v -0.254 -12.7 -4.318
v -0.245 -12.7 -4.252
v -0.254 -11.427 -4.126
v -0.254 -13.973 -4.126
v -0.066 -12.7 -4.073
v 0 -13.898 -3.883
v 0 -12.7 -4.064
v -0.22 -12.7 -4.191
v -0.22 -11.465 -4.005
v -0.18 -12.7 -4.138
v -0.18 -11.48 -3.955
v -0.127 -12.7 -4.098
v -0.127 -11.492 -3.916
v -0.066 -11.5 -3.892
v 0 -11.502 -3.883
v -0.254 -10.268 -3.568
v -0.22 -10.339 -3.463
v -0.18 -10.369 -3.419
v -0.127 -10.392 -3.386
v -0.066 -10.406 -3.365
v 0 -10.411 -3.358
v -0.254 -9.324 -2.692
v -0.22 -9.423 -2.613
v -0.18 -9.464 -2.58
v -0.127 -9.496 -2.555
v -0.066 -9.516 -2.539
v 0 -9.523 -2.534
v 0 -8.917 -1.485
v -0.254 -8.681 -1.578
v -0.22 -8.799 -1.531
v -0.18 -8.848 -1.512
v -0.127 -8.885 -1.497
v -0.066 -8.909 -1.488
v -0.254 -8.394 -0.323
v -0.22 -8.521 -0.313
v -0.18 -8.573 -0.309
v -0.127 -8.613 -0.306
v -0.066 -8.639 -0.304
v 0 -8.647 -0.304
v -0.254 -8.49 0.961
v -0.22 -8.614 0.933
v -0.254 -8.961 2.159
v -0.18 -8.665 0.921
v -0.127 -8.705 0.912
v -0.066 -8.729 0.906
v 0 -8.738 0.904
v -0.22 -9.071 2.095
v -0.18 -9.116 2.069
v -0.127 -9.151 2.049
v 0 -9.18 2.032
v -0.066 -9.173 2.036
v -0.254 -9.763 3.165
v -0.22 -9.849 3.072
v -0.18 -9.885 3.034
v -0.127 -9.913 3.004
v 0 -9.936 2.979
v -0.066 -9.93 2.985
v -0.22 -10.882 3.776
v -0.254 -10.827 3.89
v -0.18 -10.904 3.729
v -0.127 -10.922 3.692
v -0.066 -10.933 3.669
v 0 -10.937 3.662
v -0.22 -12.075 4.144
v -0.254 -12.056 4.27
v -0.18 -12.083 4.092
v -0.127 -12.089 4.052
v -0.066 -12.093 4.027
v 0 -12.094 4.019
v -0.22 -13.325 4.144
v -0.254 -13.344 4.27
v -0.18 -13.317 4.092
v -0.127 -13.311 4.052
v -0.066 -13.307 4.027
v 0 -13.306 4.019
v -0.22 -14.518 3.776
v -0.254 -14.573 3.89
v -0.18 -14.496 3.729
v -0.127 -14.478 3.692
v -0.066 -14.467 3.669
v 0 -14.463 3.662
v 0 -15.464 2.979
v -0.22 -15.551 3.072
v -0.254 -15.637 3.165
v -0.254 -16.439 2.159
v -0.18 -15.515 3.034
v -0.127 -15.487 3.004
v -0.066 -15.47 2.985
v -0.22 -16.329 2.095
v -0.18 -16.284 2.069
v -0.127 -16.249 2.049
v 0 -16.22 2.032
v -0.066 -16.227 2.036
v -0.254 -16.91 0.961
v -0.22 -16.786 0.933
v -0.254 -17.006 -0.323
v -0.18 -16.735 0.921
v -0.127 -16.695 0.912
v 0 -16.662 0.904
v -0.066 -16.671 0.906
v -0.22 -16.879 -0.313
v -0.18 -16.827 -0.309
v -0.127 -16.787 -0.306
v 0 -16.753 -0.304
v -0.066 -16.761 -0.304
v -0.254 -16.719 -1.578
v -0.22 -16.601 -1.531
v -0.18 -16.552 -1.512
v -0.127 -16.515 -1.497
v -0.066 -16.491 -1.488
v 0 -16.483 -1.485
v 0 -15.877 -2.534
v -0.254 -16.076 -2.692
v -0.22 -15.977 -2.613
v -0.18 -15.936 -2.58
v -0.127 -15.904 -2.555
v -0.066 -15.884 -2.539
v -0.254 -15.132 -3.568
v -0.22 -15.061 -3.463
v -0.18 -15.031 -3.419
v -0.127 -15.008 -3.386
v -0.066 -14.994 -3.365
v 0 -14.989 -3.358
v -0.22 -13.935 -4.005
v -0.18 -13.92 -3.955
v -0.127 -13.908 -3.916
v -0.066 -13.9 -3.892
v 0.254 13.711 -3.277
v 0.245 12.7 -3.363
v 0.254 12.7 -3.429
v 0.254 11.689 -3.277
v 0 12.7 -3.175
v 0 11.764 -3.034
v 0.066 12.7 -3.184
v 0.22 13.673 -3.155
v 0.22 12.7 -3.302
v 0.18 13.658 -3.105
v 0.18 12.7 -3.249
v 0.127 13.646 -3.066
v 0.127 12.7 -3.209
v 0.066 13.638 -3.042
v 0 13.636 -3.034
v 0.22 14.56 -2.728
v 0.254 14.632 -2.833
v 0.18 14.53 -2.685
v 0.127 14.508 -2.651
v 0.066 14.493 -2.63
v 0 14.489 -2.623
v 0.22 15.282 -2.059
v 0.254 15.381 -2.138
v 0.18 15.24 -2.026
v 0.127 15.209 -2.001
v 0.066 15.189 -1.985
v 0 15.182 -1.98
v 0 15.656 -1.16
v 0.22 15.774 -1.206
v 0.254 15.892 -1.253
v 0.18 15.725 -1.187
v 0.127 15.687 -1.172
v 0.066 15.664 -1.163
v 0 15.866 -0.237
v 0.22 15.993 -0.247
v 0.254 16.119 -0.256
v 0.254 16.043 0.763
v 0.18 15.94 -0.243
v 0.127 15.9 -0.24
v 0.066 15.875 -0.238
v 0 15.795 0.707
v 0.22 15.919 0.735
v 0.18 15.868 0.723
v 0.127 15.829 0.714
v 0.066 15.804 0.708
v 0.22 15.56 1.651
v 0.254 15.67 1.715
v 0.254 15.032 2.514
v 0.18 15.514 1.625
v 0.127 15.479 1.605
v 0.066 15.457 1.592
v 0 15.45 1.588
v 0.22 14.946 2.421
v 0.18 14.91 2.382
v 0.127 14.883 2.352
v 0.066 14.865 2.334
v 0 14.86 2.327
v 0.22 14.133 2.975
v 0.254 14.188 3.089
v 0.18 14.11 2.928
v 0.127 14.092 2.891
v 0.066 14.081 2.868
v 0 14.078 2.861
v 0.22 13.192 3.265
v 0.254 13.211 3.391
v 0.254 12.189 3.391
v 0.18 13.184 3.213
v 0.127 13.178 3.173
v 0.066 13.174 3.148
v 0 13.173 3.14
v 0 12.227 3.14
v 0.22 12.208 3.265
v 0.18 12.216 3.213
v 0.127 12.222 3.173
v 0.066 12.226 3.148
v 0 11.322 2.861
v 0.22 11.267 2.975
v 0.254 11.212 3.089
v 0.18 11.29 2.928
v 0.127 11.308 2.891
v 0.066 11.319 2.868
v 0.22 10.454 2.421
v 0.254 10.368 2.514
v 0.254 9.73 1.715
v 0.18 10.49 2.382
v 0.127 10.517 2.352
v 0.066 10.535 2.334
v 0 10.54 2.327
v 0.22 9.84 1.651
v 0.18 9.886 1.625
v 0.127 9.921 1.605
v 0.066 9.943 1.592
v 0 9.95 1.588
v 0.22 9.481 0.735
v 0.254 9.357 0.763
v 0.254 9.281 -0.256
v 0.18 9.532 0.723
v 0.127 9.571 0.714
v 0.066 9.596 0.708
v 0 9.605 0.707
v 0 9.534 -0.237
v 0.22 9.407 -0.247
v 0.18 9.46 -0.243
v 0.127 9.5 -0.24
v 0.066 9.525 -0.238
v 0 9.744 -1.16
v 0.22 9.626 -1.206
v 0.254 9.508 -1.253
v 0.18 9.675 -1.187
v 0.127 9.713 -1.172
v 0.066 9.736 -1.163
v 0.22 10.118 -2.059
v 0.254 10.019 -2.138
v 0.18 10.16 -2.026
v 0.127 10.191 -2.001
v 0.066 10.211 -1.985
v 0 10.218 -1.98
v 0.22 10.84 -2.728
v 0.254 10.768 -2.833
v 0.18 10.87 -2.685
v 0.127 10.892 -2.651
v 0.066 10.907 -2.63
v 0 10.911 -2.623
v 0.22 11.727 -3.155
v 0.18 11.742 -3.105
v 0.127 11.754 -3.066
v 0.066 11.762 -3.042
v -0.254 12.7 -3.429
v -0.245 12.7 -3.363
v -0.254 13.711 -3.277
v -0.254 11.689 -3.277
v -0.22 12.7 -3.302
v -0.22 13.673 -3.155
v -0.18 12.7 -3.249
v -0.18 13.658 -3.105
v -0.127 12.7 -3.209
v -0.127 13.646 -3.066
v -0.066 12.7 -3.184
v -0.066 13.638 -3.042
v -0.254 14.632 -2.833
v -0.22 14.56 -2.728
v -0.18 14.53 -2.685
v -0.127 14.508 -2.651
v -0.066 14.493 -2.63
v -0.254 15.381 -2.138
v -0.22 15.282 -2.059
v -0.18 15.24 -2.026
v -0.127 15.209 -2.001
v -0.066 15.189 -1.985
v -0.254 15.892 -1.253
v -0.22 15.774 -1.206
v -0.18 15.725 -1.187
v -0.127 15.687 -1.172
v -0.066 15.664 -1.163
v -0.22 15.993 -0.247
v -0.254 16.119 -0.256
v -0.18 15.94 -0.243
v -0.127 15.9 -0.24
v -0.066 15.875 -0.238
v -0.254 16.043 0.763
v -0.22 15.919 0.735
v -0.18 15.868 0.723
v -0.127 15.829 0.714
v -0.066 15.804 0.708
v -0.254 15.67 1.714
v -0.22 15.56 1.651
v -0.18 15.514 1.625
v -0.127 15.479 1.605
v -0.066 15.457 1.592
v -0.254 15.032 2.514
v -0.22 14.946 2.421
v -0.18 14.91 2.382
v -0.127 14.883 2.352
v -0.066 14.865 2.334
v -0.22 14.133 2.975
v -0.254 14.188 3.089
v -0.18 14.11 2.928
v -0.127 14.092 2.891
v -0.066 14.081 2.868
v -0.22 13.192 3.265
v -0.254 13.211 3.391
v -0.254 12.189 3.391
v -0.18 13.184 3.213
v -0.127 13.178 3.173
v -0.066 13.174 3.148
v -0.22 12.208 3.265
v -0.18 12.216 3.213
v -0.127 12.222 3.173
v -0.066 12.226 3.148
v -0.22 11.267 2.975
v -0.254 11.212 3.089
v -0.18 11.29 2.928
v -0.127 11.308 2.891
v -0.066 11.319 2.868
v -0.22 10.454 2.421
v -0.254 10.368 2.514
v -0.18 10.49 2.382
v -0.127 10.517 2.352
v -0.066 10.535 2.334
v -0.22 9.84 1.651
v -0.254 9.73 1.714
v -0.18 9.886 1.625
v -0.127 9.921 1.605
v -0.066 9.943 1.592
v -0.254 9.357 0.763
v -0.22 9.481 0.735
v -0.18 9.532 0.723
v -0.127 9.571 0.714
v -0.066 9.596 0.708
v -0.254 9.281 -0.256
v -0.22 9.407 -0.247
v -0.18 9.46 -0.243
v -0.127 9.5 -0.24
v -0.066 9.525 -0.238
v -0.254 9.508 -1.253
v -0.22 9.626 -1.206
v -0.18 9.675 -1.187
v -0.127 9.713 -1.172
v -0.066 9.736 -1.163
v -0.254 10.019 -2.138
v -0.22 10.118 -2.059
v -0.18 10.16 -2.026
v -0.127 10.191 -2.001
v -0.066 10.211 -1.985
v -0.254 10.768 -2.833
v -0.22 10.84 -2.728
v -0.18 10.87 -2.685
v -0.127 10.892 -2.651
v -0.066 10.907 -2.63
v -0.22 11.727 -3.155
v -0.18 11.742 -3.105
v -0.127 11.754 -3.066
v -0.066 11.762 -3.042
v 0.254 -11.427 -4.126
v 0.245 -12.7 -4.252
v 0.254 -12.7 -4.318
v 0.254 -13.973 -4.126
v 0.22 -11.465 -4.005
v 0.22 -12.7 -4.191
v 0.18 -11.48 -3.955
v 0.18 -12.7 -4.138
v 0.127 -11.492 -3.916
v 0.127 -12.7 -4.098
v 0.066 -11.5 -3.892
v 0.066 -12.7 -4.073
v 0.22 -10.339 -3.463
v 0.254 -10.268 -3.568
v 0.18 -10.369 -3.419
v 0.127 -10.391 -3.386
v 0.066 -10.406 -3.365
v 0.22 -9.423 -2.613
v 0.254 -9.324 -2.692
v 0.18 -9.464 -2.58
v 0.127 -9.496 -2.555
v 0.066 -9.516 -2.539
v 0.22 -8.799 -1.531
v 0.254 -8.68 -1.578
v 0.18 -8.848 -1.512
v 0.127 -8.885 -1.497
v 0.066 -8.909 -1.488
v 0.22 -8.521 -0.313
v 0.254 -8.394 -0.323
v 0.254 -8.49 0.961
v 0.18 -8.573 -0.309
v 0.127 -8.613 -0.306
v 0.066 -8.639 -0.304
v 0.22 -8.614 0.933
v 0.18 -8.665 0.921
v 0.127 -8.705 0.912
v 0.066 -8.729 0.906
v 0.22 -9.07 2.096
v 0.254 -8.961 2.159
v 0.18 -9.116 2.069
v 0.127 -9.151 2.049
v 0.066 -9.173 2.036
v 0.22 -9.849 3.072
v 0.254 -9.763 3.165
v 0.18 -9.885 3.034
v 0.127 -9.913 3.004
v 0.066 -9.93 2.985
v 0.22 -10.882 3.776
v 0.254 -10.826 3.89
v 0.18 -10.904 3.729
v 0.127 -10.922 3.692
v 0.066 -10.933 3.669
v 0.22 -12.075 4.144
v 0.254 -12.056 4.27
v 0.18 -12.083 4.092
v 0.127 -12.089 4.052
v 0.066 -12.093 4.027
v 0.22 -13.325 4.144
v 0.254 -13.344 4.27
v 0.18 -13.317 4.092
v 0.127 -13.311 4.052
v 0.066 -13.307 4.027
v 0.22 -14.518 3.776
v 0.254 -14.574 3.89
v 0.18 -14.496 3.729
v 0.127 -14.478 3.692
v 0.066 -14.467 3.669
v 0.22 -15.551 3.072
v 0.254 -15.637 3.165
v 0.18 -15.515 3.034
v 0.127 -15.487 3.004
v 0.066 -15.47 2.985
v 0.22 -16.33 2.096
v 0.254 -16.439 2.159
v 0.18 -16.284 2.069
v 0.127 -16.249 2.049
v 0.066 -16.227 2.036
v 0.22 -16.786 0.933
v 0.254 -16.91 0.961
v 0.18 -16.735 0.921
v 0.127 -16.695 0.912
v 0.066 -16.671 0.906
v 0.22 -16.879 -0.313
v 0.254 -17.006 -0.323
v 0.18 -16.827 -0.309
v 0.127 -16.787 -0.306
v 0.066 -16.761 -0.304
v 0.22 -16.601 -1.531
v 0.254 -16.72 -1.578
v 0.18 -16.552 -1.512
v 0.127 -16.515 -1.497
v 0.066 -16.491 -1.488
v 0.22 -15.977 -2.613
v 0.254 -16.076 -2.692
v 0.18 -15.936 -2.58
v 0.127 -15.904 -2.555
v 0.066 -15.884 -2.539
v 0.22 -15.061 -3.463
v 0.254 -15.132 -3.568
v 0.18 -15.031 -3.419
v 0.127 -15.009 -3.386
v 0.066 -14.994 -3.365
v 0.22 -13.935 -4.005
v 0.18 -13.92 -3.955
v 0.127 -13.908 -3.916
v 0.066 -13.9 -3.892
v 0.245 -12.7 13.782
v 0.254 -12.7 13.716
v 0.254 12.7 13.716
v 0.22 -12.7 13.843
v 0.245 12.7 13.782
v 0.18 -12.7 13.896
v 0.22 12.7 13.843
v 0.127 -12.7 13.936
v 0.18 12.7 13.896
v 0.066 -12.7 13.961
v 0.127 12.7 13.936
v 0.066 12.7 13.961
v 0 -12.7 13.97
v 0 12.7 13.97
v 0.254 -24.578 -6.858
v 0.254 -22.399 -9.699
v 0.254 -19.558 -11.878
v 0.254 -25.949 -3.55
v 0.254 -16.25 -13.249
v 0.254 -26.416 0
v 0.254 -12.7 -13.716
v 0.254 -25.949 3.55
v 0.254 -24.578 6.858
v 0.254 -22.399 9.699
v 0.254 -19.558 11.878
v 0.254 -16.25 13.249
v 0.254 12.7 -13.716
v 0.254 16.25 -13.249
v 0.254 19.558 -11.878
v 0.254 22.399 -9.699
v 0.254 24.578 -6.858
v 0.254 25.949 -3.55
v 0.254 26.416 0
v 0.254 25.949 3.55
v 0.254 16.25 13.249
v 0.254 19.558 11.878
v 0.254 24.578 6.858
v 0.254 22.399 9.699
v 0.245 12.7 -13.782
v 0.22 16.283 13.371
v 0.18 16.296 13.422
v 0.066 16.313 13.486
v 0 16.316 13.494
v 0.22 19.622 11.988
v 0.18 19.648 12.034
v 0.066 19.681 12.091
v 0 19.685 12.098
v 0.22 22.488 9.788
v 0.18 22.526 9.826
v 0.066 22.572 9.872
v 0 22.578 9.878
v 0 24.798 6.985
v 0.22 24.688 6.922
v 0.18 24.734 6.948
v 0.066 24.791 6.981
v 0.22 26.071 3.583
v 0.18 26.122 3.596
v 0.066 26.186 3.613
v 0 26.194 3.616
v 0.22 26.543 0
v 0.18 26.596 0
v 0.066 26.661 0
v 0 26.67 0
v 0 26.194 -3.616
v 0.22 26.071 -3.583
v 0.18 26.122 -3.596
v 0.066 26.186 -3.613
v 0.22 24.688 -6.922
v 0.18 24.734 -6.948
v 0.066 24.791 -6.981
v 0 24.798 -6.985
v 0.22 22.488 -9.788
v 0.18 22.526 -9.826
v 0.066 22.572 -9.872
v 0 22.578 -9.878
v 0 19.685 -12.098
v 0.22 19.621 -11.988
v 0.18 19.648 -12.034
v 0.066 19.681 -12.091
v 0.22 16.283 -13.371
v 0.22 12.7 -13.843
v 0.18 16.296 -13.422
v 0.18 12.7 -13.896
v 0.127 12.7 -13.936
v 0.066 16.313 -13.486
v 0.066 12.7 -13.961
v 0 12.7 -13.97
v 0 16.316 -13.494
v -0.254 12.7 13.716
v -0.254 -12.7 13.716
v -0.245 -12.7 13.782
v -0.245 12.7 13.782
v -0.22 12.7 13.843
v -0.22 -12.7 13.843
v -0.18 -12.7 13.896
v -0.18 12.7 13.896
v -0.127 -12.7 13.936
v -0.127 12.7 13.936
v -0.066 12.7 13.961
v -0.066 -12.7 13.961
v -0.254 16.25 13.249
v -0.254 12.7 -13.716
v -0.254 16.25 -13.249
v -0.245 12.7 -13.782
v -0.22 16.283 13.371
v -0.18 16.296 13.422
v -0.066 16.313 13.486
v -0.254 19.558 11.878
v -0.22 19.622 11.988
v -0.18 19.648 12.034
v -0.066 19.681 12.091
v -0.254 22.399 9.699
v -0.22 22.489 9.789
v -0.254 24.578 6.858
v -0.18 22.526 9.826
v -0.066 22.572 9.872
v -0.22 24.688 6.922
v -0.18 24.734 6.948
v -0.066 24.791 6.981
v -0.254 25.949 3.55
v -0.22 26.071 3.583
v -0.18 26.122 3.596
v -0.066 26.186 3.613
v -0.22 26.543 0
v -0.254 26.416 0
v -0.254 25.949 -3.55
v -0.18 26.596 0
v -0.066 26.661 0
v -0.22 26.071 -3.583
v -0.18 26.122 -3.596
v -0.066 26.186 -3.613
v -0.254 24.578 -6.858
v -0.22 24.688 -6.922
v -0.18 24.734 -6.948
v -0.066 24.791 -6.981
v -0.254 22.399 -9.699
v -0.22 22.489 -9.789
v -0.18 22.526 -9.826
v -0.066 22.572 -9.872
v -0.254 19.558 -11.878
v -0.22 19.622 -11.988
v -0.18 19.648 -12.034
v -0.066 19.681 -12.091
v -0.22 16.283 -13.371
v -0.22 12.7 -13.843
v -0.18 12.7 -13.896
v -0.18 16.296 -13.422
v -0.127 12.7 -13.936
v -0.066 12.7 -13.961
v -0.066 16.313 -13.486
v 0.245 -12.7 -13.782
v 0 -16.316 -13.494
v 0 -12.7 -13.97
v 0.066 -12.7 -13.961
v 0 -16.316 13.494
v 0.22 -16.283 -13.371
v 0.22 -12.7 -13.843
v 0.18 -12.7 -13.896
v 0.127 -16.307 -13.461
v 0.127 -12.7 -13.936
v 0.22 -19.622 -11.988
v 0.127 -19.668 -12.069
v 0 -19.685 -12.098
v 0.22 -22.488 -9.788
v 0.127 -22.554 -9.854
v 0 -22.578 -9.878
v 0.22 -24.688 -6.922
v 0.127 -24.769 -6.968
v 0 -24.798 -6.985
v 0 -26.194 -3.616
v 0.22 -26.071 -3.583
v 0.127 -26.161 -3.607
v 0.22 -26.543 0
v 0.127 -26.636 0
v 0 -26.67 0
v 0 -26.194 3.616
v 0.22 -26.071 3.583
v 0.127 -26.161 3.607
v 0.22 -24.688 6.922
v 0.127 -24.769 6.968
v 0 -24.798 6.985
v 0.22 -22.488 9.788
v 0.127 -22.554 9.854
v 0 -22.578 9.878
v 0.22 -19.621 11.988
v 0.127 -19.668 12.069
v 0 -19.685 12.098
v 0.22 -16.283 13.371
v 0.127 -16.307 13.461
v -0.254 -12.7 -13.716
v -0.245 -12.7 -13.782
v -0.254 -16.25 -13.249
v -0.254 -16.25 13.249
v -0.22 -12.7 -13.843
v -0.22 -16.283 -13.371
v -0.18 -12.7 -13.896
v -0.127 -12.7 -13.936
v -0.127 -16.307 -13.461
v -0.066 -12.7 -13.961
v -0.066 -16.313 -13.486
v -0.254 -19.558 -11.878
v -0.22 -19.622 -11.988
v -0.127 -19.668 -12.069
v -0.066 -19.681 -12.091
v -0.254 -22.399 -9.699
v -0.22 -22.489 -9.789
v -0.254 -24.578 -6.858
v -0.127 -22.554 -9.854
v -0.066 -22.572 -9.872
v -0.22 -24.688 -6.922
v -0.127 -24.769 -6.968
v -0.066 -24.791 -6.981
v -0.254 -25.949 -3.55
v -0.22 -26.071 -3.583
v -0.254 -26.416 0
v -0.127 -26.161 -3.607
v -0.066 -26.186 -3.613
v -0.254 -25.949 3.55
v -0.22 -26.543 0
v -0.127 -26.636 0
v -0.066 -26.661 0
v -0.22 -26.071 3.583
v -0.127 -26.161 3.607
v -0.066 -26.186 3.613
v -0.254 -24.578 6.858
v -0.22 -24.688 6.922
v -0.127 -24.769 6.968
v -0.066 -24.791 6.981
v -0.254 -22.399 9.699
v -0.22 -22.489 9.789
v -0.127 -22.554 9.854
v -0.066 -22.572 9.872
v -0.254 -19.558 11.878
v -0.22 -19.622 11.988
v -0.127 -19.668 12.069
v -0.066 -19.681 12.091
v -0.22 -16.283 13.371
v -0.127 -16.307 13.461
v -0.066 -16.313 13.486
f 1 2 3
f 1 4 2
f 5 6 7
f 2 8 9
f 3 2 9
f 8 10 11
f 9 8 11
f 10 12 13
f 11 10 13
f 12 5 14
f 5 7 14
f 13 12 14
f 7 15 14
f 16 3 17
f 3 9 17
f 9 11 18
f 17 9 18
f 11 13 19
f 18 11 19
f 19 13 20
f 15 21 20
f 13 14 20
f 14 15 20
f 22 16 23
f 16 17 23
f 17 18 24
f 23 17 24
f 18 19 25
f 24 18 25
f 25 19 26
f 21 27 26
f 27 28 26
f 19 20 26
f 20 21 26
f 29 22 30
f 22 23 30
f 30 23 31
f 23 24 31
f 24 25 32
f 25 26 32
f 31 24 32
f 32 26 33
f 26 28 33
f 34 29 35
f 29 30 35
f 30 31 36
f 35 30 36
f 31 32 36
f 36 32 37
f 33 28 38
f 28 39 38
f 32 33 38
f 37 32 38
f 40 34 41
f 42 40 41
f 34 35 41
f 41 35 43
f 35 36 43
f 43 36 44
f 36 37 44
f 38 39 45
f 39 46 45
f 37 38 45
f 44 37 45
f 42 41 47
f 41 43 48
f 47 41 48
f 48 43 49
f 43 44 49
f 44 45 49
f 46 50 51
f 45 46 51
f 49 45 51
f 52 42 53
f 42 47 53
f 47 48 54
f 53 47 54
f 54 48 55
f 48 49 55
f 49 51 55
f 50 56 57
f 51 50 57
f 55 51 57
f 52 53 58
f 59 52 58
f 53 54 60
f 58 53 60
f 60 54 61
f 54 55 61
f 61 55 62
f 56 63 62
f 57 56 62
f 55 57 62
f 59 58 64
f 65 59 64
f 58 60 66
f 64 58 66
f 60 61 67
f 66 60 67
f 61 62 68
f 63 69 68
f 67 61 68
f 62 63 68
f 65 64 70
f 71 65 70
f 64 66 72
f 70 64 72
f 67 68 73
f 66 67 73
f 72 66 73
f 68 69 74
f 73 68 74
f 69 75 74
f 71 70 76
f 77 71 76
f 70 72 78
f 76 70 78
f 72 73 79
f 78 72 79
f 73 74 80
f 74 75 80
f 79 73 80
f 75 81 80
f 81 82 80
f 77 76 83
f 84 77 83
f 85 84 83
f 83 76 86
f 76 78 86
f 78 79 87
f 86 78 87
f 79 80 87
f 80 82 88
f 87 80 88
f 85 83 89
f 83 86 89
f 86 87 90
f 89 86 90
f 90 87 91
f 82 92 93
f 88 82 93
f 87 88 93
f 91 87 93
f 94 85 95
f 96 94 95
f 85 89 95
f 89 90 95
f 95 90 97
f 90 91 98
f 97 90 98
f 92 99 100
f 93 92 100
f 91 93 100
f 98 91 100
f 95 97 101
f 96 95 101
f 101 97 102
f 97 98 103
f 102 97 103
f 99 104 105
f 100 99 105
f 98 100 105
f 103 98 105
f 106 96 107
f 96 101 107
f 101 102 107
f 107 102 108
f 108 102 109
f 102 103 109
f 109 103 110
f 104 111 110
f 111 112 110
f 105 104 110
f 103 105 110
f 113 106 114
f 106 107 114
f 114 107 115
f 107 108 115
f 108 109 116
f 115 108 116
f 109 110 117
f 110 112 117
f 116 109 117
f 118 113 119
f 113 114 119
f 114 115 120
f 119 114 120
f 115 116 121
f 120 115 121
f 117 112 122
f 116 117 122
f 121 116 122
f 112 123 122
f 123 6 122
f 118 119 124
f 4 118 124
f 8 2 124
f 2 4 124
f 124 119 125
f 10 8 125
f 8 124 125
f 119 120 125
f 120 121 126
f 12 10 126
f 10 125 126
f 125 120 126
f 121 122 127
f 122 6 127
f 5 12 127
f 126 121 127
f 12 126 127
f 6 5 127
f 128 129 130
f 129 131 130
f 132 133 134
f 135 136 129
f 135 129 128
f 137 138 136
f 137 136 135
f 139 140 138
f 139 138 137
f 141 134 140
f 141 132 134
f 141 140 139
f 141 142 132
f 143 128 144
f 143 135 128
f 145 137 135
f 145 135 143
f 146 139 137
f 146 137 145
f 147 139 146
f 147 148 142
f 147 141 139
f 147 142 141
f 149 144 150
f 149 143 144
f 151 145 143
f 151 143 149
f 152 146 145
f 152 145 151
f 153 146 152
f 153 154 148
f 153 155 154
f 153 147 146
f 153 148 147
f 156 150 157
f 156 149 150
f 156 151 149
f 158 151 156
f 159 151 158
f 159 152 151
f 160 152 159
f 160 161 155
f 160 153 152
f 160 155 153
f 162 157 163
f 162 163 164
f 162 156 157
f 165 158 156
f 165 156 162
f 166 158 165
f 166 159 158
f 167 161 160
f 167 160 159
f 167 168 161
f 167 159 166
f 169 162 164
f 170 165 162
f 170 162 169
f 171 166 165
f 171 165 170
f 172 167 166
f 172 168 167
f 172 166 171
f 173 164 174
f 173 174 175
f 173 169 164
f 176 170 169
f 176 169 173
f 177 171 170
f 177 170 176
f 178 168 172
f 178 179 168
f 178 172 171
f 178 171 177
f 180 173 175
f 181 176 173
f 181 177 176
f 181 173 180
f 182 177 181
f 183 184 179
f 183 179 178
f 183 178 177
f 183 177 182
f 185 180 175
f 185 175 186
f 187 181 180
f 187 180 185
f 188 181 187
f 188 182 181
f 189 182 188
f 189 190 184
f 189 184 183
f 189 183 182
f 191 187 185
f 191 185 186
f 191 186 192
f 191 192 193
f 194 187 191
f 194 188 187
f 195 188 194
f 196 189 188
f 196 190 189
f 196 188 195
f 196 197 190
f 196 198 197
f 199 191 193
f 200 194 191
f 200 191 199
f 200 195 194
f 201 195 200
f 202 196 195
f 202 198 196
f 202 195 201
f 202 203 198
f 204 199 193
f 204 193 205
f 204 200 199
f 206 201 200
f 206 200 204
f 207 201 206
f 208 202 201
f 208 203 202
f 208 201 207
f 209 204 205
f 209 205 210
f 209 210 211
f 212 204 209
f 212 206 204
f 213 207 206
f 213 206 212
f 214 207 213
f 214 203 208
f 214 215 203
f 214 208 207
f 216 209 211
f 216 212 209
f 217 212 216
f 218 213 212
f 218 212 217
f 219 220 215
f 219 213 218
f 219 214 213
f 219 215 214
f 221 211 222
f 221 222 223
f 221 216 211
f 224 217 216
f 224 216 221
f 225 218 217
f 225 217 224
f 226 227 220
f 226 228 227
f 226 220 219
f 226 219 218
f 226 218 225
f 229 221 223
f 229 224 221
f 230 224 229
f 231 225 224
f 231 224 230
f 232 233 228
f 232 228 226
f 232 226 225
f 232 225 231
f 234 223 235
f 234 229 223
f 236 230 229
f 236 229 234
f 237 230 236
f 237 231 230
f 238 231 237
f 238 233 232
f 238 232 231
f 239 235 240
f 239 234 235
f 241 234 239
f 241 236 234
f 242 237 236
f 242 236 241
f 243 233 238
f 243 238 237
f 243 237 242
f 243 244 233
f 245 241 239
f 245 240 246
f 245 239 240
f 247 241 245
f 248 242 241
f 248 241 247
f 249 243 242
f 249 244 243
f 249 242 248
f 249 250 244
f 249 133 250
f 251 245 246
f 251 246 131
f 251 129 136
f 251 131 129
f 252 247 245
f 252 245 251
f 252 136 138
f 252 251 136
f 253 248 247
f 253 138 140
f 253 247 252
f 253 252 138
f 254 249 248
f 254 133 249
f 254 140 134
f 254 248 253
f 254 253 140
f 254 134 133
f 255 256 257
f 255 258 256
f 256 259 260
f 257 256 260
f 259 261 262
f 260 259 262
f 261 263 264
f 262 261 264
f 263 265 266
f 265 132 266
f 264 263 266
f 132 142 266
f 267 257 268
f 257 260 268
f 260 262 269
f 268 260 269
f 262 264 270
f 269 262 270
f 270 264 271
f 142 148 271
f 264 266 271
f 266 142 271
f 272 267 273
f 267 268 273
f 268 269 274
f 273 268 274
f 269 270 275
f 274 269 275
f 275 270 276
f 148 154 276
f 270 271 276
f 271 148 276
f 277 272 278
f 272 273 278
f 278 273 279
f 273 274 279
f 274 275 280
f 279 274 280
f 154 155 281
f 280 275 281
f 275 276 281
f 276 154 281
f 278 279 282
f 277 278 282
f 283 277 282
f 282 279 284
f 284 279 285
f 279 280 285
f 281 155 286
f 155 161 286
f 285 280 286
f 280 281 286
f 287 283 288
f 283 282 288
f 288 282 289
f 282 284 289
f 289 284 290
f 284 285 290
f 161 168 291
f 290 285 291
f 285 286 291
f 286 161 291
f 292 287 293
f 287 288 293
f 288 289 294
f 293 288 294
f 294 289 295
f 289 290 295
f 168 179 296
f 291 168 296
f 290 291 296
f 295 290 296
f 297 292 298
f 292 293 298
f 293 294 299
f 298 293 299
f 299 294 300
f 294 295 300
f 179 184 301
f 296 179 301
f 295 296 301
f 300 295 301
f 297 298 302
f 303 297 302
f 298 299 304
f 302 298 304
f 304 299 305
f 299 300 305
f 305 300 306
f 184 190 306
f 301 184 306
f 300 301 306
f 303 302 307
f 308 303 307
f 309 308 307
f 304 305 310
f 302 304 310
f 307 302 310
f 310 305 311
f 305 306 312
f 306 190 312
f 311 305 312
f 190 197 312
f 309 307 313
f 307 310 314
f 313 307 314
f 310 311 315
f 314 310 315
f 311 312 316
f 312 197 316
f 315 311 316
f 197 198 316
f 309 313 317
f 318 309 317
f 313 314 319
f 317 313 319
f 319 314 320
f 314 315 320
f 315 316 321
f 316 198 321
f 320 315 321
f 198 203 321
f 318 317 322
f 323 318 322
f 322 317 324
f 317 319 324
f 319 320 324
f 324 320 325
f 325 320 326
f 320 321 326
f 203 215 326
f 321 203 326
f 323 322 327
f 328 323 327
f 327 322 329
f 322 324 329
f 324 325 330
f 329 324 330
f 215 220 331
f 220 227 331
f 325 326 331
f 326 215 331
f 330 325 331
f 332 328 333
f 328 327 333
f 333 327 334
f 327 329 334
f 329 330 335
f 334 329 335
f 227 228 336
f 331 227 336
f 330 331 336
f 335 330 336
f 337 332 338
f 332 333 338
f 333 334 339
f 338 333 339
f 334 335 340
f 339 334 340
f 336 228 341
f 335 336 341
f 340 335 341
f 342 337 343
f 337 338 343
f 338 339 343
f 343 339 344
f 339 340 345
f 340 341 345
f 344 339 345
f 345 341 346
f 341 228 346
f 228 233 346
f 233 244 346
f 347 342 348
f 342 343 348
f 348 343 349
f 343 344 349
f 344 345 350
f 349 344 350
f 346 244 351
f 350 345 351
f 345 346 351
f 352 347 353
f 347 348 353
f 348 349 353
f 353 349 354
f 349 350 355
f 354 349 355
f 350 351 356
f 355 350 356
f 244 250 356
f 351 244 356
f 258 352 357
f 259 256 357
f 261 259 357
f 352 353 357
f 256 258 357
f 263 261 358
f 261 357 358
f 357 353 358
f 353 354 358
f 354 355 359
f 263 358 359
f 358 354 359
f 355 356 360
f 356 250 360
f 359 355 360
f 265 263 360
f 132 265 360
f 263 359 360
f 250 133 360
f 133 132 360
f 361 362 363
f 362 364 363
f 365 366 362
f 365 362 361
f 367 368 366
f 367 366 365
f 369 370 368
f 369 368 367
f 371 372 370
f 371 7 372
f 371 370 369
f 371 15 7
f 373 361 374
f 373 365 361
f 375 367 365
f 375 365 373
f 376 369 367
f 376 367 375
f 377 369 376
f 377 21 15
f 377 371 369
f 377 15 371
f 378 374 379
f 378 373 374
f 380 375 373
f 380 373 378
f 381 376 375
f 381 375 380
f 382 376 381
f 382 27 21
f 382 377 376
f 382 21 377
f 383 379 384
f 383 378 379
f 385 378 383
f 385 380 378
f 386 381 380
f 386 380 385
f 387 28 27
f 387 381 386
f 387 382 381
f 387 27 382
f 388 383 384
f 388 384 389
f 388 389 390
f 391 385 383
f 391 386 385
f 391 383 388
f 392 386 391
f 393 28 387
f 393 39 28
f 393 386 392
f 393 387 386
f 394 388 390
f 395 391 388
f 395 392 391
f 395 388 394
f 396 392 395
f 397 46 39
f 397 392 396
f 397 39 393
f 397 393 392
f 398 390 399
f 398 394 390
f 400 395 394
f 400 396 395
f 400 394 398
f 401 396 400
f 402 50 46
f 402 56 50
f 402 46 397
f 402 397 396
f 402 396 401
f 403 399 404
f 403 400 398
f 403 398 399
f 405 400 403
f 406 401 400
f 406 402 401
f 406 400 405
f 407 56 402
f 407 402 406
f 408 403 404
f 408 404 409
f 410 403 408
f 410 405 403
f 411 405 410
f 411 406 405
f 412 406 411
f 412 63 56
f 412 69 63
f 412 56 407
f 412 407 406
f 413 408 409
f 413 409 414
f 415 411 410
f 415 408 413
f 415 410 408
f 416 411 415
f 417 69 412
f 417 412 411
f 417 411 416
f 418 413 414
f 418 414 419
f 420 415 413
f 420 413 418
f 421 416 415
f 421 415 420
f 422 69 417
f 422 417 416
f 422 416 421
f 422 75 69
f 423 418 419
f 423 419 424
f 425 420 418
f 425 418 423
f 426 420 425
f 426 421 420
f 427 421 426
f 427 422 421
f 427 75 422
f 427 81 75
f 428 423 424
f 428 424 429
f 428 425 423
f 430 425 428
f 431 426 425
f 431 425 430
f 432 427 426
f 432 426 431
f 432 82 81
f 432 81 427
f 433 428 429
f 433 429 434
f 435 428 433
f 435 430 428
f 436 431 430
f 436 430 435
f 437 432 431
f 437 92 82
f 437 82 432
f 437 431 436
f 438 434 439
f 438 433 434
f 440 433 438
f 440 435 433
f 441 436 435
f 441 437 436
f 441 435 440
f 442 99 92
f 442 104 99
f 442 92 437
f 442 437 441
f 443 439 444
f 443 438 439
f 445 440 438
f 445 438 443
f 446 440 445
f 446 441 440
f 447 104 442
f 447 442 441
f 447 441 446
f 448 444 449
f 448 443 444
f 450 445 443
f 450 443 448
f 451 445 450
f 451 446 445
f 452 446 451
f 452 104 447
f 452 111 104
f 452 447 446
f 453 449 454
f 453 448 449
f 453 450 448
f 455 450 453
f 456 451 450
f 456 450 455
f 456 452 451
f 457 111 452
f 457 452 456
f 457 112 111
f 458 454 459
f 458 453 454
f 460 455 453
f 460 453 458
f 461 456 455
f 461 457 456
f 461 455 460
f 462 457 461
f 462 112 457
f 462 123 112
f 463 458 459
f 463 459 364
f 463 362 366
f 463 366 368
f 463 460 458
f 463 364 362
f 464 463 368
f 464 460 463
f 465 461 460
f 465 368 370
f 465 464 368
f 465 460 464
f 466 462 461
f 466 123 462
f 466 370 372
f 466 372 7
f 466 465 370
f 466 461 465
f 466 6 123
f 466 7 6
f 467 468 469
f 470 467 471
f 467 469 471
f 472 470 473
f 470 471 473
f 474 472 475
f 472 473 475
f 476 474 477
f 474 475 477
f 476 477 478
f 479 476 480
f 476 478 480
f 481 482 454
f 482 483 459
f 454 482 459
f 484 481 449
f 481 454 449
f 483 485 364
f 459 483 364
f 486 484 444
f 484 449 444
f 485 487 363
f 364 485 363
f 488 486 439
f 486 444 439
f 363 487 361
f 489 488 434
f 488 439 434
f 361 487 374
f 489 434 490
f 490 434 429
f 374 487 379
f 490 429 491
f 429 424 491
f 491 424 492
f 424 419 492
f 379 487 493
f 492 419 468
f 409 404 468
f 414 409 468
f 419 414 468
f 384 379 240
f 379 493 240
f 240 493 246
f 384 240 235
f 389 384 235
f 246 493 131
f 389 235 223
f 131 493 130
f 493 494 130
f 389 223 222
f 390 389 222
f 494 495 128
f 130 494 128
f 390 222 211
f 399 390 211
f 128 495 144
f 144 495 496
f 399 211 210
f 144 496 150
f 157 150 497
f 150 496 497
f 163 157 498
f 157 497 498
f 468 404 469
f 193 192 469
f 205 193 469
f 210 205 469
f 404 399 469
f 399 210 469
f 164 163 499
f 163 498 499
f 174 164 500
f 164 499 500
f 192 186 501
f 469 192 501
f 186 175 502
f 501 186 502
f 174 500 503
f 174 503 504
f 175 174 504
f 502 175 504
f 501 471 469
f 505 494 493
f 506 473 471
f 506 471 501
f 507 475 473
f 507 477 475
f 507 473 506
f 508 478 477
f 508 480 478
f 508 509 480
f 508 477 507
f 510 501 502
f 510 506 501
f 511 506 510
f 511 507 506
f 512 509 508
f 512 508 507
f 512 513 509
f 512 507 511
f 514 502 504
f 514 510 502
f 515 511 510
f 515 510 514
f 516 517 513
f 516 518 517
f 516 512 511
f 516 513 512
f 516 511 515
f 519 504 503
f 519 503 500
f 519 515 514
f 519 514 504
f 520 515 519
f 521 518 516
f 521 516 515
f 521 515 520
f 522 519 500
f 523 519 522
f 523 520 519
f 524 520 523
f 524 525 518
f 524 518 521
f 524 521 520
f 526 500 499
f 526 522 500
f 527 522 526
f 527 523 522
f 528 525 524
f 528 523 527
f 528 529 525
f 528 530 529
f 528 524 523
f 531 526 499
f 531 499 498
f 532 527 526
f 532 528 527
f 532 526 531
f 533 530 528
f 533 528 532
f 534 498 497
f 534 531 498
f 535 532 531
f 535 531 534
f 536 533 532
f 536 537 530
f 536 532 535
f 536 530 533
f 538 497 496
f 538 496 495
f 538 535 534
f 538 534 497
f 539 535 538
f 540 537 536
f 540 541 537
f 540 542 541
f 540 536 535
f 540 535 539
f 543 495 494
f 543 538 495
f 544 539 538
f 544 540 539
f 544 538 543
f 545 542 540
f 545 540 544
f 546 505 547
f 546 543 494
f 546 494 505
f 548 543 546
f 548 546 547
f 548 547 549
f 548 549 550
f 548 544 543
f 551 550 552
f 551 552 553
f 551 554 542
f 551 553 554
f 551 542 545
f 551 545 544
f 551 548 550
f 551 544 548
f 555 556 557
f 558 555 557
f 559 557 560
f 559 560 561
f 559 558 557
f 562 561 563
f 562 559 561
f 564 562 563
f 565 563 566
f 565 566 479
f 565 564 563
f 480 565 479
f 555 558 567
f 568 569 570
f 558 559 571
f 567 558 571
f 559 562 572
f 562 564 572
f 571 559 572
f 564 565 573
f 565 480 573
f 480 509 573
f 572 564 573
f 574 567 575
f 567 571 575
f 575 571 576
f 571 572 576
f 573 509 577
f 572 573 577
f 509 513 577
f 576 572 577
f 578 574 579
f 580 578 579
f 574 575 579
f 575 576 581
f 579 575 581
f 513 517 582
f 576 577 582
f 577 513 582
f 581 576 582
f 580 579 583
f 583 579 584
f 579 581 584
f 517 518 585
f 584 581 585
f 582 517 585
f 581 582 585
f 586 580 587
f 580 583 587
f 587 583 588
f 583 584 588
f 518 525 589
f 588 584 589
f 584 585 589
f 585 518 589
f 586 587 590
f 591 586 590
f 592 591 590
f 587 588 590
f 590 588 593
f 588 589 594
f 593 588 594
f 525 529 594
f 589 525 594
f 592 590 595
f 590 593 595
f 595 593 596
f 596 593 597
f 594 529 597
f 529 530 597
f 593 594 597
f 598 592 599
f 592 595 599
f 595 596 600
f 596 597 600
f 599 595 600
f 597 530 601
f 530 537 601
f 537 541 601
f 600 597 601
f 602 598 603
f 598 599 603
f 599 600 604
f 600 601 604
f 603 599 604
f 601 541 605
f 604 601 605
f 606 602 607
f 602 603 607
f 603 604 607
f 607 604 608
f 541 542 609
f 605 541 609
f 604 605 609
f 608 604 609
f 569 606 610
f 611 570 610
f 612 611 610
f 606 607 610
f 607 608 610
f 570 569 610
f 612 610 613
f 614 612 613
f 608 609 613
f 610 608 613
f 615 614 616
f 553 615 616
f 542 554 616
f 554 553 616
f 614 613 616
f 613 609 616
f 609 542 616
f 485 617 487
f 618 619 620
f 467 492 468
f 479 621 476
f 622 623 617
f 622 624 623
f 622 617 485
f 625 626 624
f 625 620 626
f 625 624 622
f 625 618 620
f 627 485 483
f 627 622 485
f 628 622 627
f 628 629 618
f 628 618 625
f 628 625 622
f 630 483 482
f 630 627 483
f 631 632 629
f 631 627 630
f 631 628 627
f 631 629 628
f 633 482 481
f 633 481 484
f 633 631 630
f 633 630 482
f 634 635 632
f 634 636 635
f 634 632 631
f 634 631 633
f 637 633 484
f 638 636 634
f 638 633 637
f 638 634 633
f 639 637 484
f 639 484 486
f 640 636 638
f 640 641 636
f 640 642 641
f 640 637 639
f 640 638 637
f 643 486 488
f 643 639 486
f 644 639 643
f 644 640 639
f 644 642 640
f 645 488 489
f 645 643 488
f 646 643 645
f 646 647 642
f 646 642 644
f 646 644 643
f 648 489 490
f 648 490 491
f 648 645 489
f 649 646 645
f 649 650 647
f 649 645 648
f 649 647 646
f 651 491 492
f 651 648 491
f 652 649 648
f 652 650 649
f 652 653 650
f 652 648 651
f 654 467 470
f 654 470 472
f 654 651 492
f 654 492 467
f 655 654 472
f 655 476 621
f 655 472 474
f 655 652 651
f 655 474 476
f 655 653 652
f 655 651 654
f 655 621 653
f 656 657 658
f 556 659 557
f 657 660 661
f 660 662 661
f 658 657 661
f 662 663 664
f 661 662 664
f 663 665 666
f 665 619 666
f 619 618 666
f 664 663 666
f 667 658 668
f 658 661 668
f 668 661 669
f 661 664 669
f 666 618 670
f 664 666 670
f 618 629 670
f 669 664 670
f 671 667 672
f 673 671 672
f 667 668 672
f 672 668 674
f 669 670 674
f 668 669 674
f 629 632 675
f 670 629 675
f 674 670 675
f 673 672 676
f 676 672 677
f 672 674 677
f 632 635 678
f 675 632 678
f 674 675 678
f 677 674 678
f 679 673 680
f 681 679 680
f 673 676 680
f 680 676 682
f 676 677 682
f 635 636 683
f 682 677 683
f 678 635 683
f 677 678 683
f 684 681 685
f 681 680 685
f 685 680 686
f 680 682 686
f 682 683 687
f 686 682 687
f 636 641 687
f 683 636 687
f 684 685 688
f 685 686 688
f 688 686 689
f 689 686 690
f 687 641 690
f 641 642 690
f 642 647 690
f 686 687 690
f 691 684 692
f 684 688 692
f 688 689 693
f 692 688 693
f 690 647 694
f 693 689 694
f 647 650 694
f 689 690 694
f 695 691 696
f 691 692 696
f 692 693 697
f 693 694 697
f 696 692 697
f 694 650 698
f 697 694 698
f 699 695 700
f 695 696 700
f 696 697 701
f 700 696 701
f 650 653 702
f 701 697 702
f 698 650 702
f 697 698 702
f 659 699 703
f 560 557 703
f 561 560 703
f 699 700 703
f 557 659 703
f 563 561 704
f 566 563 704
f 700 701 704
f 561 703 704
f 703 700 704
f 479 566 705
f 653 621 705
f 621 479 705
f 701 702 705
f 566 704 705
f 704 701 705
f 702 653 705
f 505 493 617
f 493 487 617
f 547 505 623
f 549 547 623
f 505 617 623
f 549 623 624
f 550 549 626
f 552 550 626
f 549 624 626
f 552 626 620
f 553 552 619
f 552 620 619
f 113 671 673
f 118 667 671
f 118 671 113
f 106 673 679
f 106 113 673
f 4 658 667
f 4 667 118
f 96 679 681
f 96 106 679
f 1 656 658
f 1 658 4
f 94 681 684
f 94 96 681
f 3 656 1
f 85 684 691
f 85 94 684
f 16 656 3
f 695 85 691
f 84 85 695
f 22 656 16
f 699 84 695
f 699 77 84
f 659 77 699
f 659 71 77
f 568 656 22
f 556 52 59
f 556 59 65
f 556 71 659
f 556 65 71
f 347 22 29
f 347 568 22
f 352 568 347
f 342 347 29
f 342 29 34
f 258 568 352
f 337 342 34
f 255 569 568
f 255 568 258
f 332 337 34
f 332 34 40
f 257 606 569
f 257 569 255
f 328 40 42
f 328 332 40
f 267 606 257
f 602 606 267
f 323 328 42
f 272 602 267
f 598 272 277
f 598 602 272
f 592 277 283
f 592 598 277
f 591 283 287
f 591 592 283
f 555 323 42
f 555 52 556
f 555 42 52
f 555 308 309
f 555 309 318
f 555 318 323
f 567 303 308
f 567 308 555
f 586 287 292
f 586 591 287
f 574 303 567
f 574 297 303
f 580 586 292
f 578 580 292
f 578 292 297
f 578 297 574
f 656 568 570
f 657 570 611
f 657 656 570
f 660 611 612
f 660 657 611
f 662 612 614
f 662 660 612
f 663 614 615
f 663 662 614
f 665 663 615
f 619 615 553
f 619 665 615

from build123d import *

# Parameters (mm, degrees)
SKETCH2_R           = 3.175
SKETCH2_R_2         = 4.064
BOSS_EXTRUDE1_DEPTH = 0.254
FILLET1_R           = 0.254
FILLET2_R           = 0.254


with BuildPart() as part:
    # Sketch2 → Boss-Extrude1 (new, symmetric)
    with BuildSketch(Plane(origin=(0, 0, 0), x_dir=(0, 0, -1), z_dir=(1, 0, 0))):
        with BuildLine():
            Line((13.97, 12.7), (13.97, -12.7))
            ThreePointArc((13.97, -12.7), (0, -26.67), (-13.97, -12.7))
            Line((-13.97, -12.7), (-13.97, 12.7))
            ThreePointArc((-13.97, 12.7), (0, 26.67), (13.97, 12.7))
        make_face()
        with Locations((0, 12.7)):
            Circle(SKETCH2_R, mode=Mode.SUBTRACT)
        with Locations((0, -12.7)):
            Circle(SKETCH2_R_2, mode=Mode.SUBTRACT)
    extrude(amount=BOSS_EXTRUDE1_DEPTH, both=True)

    # Fillet1
    fillet1_edges = [part.edges().sort_by_distance(p)[0] for p in [
        (0.254, -26.67, 0),
        (0.254, 12.7, 3.175),
        (0.254, 0, -13.97),
        (0.254, -12.7, 4.064),
        (0.254, 26.67, 0),
        (0.254, 0, 13.97),
    ]]
    fillet(fillet1_edges, radius=FILLET1_R)

    # Fillet2
    fillet2_edges = [part.edges().sort_by_distance(p)[0] for p in [
        (-0.254, -12.7, 4.064),
        (-0.254, 12.7, 3.175),
        (-0.254, 0, 13.97),
        (-0.254, -26.67, 0),
        (-0.254, 0, -13.97),
        (-0.254, 26.67, 0),
    ]]
    fillet(fillet2_edges, radius=FILLET2_R - 0.0001)  # a hair under: the kernel refuses the full size


solid = part.part
